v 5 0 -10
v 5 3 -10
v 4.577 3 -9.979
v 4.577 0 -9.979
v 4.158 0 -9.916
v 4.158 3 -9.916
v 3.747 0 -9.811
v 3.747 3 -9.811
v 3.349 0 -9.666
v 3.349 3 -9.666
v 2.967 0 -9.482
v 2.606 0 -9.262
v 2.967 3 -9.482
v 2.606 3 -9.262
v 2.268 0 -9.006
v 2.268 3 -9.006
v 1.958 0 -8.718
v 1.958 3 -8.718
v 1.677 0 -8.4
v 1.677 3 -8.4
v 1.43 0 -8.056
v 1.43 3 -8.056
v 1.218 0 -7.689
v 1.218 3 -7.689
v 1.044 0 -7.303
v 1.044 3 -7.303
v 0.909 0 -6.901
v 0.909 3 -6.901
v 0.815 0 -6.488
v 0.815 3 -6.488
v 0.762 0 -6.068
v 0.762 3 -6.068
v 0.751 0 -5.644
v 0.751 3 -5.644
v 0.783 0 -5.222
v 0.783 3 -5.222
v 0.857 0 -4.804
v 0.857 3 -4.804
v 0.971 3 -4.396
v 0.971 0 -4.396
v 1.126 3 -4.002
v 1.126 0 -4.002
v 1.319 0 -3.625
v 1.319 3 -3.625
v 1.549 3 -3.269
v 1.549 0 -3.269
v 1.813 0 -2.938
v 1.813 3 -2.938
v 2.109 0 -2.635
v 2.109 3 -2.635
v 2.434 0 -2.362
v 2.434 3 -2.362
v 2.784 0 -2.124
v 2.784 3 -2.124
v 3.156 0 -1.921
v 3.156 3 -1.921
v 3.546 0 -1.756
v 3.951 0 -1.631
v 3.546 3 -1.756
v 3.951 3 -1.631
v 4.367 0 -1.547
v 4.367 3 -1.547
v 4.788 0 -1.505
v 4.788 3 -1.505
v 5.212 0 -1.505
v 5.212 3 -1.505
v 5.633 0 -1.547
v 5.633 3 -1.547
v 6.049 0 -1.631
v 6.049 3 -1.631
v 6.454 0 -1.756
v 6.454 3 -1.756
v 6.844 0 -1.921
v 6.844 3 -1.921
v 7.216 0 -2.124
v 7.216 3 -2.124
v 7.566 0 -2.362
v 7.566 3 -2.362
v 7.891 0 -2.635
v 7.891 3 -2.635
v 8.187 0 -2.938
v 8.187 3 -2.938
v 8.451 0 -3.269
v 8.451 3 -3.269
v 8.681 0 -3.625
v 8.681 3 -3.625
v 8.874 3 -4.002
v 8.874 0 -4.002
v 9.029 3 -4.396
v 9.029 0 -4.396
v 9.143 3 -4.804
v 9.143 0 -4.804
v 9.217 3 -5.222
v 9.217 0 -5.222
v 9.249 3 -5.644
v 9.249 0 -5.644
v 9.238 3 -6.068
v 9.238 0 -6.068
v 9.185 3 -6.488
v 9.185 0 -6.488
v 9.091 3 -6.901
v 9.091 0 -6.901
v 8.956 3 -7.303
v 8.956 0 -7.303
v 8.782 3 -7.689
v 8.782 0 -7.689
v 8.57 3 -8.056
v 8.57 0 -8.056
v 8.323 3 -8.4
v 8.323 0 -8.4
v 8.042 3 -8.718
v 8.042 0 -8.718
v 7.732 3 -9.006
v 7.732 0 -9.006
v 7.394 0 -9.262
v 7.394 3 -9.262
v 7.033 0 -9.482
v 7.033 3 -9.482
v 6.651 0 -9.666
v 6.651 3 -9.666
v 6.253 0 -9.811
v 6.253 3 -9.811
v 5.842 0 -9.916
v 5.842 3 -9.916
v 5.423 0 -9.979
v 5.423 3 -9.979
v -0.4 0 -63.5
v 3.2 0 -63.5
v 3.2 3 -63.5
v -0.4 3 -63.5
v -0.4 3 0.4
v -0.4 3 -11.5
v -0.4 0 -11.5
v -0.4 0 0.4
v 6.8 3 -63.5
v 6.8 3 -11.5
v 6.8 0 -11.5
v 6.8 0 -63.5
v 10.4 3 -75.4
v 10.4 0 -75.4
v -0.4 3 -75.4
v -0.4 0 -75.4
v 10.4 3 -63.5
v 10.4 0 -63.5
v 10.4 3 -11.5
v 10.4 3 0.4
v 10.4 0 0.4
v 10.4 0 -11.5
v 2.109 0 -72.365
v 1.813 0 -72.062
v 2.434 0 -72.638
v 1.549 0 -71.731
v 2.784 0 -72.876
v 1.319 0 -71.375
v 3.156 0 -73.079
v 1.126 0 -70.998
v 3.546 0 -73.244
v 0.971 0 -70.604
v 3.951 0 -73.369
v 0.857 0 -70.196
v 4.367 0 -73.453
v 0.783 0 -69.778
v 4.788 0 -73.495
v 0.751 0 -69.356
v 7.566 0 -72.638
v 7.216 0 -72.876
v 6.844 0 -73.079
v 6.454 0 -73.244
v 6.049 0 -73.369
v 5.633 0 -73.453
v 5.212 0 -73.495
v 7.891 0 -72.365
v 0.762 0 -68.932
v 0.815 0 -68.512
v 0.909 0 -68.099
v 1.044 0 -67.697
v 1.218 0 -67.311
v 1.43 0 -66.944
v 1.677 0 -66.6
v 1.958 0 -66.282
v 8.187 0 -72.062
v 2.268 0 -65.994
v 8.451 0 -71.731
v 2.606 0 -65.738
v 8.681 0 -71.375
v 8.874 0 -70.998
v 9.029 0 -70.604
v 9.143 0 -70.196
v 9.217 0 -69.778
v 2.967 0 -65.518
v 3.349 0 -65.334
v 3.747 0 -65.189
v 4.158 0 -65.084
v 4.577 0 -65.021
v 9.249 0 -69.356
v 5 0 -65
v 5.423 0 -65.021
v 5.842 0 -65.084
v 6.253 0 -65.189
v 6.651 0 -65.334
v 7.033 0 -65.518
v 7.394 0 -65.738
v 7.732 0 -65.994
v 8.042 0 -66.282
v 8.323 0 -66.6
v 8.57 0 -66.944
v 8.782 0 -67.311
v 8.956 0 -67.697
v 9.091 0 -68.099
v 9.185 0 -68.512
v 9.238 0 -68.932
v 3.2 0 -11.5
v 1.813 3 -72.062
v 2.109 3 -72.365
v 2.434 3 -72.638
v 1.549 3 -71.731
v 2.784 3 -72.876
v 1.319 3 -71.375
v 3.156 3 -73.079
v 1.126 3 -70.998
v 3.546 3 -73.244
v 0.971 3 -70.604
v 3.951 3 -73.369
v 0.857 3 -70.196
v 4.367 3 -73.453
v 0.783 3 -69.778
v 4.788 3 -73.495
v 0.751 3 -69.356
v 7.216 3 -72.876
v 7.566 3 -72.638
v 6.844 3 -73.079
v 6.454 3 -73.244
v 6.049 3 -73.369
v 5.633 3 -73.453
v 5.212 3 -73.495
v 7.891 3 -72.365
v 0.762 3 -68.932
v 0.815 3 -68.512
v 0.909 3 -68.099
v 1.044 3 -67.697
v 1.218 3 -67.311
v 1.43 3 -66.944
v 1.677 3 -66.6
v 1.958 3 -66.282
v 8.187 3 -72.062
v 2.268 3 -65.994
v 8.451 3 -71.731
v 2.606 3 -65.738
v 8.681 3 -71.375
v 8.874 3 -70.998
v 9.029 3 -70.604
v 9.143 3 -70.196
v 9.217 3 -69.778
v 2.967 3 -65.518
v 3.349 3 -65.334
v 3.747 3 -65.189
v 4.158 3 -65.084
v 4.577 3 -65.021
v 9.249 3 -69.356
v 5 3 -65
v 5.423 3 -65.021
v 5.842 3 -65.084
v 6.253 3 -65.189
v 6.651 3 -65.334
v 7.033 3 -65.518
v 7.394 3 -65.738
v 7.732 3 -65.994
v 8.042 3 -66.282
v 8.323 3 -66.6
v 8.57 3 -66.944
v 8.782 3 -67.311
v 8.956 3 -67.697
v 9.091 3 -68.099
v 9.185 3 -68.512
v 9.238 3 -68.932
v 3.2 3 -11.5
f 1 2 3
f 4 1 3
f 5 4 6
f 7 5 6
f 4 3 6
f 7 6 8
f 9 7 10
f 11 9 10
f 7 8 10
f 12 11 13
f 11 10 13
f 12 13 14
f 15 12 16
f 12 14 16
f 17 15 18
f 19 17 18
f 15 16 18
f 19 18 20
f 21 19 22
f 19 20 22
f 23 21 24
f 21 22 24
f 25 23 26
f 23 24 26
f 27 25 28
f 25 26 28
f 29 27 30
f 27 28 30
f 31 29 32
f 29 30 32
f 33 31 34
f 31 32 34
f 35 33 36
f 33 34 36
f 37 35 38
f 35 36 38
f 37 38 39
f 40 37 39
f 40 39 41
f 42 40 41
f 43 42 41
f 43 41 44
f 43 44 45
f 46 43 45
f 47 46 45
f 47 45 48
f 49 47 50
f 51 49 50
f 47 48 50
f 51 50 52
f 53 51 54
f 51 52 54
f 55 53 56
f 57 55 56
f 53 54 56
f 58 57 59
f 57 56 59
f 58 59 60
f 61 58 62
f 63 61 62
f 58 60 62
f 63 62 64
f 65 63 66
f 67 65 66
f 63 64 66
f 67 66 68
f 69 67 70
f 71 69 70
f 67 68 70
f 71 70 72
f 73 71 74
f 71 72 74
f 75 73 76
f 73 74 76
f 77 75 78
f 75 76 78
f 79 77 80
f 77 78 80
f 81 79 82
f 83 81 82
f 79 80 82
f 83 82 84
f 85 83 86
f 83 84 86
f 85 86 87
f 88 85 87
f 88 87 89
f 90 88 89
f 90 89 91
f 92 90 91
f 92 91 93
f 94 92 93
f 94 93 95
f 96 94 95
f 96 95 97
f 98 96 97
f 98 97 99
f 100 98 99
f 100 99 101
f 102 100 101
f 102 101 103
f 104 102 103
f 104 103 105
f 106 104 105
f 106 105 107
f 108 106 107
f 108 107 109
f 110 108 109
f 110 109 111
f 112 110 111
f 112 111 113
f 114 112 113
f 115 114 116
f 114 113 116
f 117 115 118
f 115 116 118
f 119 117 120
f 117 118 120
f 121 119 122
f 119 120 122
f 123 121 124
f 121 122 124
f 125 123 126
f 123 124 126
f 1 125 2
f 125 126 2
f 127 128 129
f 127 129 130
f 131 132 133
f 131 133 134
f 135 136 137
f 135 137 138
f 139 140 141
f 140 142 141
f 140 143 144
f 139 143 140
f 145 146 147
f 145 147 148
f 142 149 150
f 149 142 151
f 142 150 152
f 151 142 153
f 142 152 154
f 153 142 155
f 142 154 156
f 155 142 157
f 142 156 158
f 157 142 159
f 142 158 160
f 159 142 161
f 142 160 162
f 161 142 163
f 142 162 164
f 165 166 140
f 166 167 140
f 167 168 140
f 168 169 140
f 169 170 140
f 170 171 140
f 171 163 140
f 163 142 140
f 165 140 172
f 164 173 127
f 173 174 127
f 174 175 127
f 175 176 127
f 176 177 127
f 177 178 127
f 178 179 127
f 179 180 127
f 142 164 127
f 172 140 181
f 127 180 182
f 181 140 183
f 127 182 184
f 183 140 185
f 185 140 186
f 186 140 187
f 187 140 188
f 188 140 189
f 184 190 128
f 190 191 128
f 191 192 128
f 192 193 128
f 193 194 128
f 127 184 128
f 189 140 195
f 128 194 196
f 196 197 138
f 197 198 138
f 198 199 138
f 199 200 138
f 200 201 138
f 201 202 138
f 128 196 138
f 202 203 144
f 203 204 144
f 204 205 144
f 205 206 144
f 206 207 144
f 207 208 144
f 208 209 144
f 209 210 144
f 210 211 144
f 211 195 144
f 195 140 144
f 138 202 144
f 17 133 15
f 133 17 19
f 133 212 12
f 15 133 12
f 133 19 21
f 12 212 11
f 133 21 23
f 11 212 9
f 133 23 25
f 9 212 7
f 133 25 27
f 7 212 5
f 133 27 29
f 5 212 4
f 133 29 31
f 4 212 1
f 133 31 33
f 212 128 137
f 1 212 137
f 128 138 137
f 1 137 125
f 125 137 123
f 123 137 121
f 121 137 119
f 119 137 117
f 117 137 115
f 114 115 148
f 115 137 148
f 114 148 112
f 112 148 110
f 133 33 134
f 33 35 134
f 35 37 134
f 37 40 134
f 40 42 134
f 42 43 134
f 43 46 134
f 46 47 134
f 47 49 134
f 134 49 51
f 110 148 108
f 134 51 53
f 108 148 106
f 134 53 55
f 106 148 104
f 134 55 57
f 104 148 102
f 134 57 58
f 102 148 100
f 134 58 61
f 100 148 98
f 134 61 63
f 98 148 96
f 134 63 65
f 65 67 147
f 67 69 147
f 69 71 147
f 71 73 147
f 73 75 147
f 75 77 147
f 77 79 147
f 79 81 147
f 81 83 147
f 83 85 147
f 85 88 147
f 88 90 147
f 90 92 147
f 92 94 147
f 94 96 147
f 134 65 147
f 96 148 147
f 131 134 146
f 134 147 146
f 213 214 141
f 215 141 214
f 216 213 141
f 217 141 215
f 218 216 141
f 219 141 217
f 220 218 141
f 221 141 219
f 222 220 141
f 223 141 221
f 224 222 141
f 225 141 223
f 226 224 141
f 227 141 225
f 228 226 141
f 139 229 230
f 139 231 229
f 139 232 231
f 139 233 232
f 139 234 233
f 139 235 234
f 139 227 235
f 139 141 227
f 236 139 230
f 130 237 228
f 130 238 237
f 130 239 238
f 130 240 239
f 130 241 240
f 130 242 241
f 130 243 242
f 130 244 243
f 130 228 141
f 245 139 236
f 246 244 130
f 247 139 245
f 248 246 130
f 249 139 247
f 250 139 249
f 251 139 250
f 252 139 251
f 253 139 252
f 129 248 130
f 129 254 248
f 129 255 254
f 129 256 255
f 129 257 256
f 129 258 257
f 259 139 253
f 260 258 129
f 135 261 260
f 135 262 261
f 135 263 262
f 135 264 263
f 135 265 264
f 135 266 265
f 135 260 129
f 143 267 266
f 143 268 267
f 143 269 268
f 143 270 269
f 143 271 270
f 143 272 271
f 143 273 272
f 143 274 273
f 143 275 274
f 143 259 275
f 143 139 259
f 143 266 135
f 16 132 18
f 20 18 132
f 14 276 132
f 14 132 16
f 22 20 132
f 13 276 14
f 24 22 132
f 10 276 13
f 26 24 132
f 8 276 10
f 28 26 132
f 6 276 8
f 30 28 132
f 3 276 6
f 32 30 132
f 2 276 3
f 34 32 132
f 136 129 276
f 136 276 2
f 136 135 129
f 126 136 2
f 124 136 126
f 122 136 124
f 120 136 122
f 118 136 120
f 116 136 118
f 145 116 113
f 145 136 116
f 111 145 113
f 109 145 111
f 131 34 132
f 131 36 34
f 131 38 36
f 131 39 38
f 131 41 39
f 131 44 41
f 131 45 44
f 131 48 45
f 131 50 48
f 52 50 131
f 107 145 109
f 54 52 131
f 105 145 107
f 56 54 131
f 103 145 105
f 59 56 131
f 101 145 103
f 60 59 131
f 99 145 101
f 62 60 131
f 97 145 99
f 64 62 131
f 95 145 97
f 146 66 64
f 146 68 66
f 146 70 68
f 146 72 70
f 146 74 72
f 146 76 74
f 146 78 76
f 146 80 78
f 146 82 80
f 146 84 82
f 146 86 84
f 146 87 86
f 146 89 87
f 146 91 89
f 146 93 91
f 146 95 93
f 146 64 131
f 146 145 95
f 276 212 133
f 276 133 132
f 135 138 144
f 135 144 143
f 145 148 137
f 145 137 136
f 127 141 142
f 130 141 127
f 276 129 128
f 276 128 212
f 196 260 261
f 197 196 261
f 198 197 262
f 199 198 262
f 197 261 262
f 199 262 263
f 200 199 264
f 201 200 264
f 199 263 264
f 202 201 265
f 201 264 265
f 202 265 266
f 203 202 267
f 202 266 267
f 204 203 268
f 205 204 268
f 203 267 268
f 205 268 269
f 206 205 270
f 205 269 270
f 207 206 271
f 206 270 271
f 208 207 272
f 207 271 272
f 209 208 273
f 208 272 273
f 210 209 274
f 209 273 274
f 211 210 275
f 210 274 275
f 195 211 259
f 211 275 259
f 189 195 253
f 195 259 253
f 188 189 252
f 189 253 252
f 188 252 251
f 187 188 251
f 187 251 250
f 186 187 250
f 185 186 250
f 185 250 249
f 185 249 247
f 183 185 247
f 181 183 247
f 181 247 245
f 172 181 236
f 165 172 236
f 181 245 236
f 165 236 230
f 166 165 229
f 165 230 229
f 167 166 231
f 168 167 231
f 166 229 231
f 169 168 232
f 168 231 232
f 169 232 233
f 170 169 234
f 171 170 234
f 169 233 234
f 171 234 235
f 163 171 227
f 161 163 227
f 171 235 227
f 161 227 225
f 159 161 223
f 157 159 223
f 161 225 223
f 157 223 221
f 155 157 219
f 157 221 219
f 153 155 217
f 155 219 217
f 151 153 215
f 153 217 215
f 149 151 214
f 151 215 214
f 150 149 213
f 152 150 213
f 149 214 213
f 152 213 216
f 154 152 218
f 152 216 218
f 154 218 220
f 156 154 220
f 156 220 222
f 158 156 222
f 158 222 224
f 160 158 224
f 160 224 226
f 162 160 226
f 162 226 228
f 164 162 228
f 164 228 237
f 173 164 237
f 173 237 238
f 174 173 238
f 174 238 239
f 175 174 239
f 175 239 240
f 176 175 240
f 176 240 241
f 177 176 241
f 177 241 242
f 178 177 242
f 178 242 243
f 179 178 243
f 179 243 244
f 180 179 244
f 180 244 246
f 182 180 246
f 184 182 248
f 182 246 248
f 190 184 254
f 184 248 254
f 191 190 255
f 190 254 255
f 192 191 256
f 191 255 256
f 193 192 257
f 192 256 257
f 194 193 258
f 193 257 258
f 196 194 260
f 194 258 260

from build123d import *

# Parameters (mm, degrees)
BOSS_EXTRUDE1_DEPTH = 3
SKETCH2_R           = 4.25
CUT_EXTRUDE1_DEPTH  = 3
SKETCH3_W           = 10
SKETCH3_H           = 3
BOSS_EXTRUDE2_DEPTH = 0.4
SKETCH4_W           = 10
SKETCH4_H           = 3
BOSS_EXTRUDE3_DEPTH = 0.4
SKETCH5_W           = 11.9
SKETCH5_H           = 3
BOSS_EXTRUDE4_DEPTH = 0.4
SKETCH6_W           = 52
SKETCH6_H           = 3
BOSS_EXTRUDE5_DEPTH = 0.4
SKETCH7_W           = 11.9
SKETCH7_H           = 3
BOSS_EXTRUDE6_DEPTH = 0.4
SKETCH8_W           = 52
SKETCH8_H           = 3
BOSS_EXTRUDE7_DEPTH = 0.4
SKETCH9_W           = 52
SKETCH9_H           = 3
CUT_EXTRUDE2_DEPTH  = 0.1
SKETCH10_W          = 52
SKETCH10_H          = 3
CUT_EXTRUDE3_DEPTH  = 0.1


with BuildPart() as part:
    # Sketch1 → Boss-Extrude1 (new body)
    with BuildSketch(Plane(origin=(0, 0, 0), x_dir=(1, 0, 0), z_dir=(0, 1, 0))):
        Polygon((0, 11.5), (3.5, 11.5), (3.5, 63.5), (0, 63.5), (0, 75), (10, 75), (10, 63.5), (6.5, 63.5), (6.5, 11.5), (10, 11.5), (10, 0), (0, 0), align=None)
    extrude(amount=BOSS_EXTRUDE1_DEPTH)

    # Sketch2 → Cut-Extrude1 (cut)
    with BuildSketch(Plane(origin=(0, 3, 0), x_dir=(1, 0, 0), z_dir=(0, 1, 0))):
        with Locations(Location((5, 69.25, 0), (0, 0, 270))):
            Circle(SKETCH2_R)
        with Locations(Location((5, 5.75, 0), (0, 0, 90))):
            Circle(SKETCH2_R)
    extrude(amount=-CUT_EXTRUDE1_DEPTH, mode=Mode.SUBTRACT)

    # Sketch3 → Boss-Extrude2 (add)
    with BuildSketch(Plane.XY):
        with Locations((5, 1.5)):
            Rectangle(SKETCH3_W, SKETCH3_H)
    extrude(amount=BOSS_EXTRUDE2_DEPTH)

    # Sketch4 → Boss-Extrude3 (add)
    with BuildSketch(Plane(origin=(0, 0, -75), x_dir=(-1, 0, 0), z_dir=(0, 0, -1))):
        with Locations((-5, 1.5)):
            Rectangle(SKETCH4_W, SKETCH4_H)
    extrude(amount=BOSS_EXTRUDE3_DEPTH)

    # Sketch5 → Boss-Extrude4 (add)
    with BuildSketch(Plane(origin=(10, 0, 0), x_dir=(0, 0, -1), z_dir=(1, 0, 0))):
        with Locations((69.45, 1.5)):
            Rectangle(SKETCH5_W, SKETCH5_H)
        with Locations((5.55, 1.5)):
            Rectangle(SKETCH5_W, SKETCH5_H)
    extrude(amount=BOSS_EXTRUDE4_DEPTH)

    # Sketch6 → Boss-Extrude5 (add)
    with BuildSketch(Plane(origin=(6.5, 0, 0), x_dir=(0, 0, -1), z_dir=(1, 0, 0))):
        with Locations((37.5, 1.5)):
            Rectangle(SKETCH6_W, SKETCH6_H)
    extrude(amount=BOSS_EXTRUDE5_DEPTH)

    # Sketch7 → Boss-Extrude6 (add)
    with BuildSketch(Plane.ZY):
        with Locations((-5.55, 1.5)):
            Rectangle(SKETCH7_W, SKETCH7_H)
        with Locations((-69.45, 1.5)):
            Rectangle(SKETCH7_W, SKETCH7_H)
    extrude(amount=BOSS_EXTRUDE6_DEPTH)

    # Sketch8 → Boss-Extrude7 (add)
    with BuildSketch(Plane.ZY.offset(-3.5)):
        with Locations((-37.5, 1.5)):
            Rectangle(SKETCH8_W, SKETCH8_H)
    extrude(amount=BOSS_EXTRUDE7_DEPTH)

    # Sketch9 → Cut-Extrude2 (cut)
    with BuildSketch(Plane.ZY.offset(-3.1)):
        with Locations((-37.5, 1.5)):
            Rectangle(SKETCH9_W, SKETCH9_H)
    extrude(amount=-CUT_EXTRUDE2_DEPTH, mode=Mode.SUBTRACT)

    # Sketch10 → Cut-Extrude3 (cut)
    with BuildSketch(Plane(origin=(6.9, 0, 0), x_dir=(0, 0, -1), z_dir=(1, 0, 0))):
        with Locations((37.5, 1.5)):
            Rectangle(SKETCH10_W, SKETCH10_H)
    extrude(amount=-CUT_EXTRUDE3_DEPTH, mode=Mode.SUBTRACT)


solid = part.part
